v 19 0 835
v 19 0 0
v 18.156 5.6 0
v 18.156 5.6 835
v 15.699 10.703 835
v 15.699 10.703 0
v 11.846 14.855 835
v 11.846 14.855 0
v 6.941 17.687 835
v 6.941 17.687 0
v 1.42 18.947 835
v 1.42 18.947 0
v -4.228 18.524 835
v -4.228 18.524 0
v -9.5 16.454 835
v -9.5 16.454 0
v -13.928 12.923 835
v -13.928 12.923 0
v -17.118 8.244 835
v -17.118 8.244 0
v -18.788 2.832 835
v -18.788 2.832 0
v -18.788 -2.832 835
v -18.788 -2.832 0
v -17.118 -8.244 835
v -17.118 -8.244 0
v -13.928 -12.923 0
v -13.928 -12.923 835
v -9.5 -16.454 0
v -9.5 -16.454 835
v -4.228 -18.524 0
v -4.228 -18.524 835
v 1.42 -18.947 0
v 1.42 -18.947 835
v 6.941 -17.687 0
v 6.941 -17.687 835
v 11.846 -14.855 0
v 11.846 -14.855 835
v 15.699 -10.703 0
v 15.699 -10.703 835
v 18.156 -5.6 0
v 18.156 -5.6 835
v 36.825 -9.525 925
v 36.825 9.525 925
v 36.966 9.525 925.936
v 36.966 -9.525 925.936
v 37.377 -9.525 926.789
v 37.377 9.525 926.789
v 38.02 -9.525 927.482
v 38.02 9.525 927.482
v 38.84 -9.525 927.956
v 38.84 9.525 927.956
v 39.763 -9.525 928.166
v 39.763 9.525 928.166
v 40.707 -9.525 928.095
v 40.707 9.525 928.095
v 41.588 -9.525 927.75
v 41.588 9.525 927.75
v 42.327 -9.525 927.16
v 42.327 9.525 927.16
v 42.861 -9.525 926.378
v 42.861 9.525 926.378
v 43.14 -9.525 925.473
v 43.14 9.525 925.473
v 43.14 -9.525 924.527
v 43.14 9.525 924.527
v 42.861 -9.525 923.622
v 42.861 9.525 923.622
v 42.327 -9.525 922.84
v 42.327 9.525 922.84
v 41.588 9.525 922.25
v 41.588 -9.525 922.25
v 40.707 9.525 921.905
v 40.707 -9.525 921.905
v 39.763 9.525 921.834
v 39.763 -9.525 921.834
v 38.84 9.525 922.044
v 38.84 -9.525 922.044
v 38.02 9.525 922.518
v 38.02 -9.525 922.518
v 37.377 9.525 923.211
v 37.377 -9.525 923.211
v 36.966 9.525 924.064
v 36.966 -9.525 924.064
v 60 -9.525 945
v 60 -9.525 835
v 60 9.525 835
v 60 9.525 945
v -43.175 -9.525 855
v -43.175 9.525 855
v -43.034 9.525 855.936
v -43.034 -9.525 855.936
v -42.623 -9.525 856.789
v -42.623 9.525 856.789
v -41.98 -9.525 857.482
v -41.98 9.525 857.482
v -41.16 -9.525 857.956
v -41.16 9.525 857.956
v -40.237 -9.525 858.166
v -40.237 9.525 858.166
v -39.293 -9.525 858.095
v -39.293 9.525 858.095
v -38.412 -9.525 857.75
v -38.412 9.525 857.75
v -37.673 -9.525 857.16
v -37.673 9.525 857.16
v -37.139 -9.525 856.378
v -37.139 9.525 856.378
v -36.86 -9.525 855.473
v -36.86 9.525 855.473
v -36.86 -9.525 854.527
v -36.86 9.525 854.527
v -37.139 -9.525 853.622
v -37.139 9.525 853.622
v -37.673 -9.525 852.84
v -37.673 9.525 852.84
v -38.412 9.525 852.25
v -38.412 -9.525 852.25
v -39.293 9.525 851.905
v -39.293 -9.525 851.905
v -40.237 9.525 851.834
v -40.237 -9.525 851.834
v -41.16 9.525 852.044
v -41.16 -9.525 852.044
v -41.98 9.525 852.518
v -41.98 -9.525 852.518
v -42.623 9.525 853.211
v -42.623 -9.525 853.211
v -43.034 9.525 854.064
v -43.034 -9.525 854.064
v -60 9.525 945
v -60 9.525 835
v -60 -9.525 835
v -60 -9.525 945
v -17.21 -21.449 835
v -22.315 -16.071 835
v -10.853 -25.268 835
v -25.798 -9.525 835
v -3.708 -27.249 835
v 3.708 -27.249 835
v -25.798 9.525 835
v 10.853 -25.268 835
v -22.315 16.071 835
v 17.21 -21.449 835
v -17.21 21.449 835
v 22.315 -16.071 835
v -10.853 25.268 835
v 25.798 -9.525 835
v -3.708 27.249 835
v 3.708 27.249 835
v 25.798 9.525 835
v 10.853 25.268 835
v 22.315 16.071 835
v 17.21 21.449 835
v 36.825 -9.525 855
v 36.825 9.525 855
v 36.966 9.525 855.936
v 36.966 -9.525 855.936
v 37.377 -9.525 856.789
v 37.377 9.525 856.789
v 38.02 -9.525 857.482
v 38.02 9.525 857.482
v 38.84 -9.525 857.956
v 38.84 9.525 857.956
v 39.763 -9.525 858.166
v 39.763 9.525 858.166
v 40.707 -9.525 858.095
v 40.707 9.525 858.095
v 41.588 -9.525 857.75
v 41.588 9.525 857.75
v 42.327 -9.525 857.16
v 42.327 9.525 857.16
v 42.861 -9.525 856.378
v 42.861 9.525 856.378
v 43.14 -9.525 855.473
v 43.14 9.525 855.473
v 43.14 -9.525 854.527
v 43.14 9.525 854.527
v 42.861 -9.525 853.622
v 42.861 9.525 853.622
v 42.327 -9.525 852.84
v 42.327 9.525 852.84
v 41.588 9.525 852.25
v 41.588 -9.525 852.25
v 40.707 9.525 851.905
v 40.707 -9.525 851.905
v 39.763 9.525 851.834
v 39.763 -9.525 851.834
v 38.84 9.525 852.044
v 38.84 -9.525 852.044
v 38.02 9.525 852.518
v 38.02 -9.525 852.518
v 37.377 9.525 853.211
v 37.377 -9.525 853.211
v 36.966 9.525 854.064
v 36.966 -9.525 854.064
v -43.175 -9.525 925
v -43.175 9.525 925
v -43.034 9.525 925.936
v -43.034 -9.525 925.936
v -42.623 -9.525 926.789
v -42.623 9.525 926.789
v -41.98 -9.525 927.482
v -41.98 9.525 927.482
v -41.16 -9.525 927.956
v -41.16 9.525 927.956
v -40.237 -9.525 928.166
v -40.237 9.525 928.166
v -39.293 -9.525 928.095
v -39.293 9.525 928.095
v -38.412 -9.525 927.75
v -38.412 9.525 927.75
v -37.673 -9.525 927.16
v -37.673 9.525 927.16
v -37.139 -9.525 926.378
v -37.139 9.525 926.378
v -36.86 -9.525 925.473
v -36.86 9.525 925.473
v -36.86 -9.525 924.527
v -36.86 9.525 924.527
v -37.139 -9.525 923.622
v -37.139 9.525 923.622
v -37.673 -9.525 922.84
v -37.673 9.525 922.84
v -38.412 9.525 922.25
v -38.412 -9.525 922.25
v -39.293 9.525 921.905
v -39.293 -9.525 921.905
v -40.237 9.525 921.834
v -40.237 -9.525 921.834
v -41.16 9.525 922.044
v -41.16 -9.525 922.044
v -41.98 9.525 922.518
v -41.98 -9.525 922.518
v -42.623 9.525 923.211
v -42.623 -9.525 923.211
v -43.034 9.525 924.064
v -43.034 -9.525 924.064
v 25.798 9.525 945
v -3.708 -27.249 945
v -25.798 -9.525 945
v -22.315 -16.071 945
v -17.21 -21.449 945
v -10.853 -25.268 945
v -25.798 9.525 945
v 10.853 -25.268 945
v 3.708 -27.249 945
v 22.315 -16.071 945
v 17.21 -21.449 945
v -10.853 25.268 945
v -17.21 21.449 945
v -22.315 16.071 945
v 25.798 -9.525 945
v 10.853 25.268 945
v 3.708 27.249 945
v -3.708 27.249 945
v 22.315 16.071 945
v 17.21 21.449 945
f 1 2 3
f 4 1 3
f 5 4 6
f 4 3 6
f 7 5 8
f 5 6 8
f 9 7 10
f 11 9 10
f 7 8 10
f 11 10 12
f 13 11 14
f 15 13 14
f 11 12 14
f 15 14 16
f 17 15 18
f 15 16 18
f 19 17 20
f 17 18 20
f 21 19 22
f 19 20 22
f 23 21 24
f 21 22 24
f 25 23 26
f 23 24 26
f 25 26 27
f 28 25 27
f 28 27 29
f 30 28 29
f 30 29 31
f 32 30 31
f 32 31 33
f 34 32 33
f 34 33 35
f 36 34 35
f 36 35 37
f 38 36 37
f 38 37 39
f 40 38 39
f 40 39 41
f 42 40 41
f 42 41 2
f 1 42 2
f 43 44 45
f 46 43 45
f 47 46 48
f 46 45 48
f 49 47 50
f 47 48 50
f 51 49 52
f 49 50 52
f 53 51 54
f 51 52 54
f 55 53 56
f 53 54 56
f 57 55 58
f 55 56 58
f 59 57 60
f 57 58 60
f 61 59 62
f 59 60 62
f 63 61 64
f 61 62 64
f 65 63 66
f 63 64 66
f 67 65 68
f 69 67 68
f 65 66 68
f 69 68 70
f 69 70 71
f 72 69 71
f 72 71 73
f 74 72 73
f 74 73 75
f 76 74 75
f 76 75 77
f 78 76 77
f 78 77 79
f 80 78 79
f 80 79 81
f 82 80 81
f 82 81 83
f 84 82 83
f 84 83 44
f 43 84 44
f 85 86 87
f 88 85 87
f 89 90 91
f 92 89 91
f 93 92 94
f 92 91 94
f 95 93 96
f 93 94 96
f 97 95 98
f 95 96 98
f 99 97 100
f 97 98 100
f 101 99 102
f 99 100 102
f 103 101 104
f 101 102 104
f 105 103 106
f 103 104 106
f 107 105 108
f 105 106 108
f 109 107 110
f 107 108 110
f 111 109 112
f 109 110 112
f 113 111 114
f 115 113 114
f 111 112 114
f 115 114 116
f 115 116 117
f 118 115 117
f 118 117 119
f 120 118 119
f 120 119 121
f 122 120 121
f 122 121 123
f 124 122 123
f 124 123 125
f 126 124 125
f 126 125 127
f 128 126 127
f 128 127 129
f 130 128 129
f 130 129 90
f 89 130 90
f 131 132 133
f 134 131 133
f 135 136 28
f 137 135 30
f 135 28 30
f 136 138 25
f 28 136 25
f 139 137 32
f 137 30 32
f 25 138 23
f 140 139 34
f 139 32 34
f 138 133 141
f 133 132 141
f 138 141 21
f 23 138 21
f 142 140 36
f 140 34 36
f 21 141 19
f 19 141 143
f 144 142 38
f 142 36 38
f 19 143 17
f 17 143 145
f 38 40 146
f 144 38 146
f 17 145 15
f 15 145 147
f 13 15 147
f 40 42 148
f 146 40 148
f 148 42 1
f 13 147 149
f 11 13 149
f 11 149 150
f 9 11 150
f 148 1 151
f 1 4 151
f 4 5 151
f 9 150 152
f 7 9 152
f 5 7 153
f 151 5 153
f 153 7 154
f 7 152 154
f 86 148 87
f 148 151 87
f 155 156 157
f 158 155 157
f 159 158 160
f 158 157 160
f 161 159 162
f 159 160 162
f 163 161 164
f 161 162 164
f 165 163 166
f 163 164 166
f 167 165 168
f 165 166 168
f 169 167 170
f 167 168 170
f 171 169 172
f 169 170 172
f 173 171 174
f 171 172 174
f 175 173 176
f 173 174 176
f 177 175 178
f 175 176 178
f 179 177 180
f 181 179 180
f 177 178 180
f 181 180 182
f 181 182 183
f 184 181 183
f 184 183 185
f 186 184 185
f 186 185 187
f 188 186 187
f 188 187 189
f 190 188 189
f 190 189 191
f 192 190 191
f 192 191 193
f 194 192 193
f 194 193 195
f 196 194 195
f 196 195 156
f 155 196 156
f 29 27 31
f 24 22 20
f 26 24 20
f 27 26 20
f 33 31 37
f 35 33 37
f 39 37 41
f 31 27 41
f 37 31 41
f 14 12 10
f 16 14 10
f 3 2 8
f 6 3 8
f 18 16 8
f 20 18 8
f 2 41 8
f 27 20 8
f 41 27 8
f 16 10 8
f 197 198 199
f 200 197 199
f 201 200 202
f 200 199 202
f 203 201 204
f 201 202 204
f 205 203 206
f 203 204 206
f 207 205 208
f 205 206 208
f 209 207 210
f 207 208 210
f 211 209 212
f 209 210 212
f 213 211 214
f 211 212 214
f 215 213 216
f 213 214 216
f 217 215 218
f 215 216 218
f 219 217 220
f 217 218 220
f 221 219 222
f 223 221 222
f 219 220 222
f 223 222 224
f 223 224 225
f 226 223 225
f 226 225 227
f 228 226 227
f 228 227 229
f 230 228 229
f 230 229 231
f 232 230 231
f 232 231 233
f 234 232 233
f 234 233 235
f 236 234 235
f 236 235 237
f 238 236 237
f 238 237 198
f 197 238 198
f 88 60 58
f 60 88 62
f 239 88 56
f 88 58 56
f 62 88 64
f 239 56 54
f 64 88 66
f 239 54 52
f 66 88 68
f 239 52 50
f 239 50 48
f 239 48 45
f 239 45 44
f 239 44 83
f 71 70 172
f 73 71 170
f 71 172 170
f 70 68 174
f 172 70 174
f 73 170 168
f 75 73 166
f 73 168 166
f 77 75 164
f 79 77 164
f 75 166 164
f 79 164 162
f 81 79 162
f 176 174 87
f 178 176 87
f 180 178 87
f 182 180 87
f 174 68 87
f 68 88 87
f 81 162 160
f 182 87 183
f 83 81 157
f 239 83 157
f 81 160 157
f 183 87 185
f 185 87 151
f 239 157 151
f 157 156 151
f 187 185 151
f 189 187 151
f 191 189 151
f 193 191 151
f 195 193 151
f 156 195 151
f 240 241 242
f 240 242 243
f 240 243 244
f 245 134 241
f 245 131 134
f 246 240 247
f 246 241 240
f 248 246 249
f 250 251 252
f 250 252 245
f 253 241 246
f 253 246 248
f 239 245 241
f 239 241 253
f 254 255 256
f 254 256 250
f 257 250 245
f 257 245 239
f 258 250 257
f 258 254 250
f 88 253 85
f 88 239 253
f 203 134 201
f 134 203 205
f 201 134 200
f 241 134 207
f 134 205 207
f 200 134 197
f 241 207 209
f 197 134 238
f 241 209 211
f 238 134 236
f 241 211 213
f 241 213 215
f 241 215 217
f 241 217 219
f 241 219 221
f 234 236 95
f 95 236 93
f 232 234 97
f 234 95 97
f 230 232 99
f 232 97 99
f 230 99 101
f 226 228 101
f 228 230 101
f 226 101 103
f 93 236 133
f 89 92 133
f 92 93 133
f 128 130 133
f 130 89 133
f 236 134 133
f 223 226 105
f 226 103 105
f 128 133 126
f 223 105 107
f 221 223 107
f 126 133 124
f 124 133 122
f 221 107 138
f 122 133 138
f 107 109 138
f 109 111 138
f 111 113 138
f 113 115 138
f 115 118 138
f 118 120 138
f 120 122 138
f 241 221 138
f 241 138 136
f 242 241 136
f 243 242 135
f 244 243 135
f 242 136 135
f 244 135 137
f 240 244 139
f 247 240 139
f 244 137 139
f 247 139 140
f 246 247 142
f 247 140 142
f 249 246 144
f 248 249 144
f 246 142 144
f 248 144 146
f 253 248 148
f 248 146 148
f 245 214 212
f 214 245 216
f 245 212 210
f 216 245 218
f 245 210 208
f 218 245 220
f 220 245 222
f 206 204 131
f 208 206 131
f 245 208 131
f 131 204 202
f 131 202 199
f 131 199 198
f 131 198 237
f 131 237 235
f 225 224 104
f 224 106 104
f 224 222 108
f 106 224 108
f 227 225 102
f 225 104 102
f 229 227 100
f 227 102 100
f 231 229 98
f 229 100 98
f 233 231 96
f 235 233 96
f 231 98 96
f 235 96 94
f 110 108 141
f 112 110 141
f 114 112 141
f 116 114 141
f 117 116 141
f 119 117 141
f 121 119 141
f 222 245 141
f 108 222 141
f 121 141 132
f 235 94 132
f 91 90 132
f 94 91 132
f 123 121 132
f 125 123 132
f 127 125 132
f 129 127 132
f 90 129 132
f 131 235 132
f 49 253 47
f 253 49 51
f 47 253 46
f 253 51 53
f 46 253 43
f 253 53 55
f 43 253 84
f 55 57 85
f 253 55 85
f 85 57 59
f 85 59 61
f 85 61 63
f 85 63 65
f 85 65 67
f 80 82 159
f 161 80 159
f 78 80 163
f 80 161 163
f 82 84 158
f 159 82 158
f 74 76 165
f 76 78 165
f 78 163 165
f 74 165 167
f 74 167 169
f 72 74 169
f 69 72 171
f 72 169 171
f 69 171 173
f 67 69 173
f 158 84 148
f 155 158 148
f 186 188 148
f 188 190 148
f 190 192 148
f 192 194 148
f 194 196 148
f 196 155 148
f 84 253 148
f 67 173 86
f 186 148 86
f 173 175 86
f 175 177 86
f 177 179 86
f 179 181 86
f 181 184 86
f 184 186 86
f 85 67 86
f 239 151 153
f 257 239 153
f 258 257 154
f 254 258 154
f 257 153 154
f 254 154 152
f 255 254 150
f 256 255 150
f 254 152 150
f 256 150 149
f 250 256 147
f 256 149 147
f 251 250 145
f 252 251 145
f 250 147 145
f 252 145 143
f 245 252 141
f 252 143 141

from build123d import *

# Parameters (mm, degrees)
SKETCH1_R           = 19
BOSS_EXTRUDE1_DEPTH = 945
BOSS_EXTRUDE2_START = -110
SKETCH2_R           = 19
BOSS_EXTRUDE2_DEPTH = 110
SKETCH3_R           = 3.175
CUT_EXTRUDE1_DEPTH  = 948.626429889


with BuildPart() as part:
    # Sketch1 → Boss-Extrude1 (new body)
    with BuildSketch(Plane.XY):
        Circle(SKETCH1_R)
    extrude(amount=BOSS_EXTRUDE1_DEPTH)

    # Sketch2 → Boss-Extrude2 (add)
    with BuildSketch(Plane.XY.offset(945).offset(BOSS_EXTRUDE2_START)):
        with BuildLine():
            Line((-60, -9.525), (-25.797759108, -9.525))
            ThreePointArc((-25.797759108, -9.525), (0, -27.5), (25.797759108, -9.525))
            Line((25.797759108, -9.525), (60, -9.525))
            Line((60, -9.525), (60, 9.525))
            Line((60, 9.525), (25.797759108, 9.525))
            ThreePointArc((25.797759108, 9.525), (0, 27.5), (-25.797759108, 9.525))
            Line((-25.797759108, 9.525), (-60, 9.525))
            Line((-60, 9.525), (-60, -9.525))
        make_face()
        Circle(SKETCH2_R, mode=Mode.SUBTRACT)
    extrude(amount=BOSS_EXTRUDE2_DEPTH)

    # Sketch3 → Cut-Extrude1 (cut, through all)
    with BuildSketch(Plane(origin=(0, 9.525, 0), x_dir=(1, 0, 0), z_dir=(0, 1, 0))):
        with Locations(Location((40, -925, 0), (0, 0, 180))):
            Circle(SKETCH3_R)
        with Locations(Location((40, -855, 0), (0, 0, 180))):
            Circle(SKETCH3_R)
        with Locations(Location((-40, -925, 0), (0, 0, 180))):
            Circle(SKETCH3_R)
        with Locations(Location((-40, -855, 0), (0, 0, 180))):
            Circle(SKETCH3_R)
    extrude(amount=-CUT_EXTRUDE1_DEPTH, mode=Mode.SUBTRACT)


solid = part.part
